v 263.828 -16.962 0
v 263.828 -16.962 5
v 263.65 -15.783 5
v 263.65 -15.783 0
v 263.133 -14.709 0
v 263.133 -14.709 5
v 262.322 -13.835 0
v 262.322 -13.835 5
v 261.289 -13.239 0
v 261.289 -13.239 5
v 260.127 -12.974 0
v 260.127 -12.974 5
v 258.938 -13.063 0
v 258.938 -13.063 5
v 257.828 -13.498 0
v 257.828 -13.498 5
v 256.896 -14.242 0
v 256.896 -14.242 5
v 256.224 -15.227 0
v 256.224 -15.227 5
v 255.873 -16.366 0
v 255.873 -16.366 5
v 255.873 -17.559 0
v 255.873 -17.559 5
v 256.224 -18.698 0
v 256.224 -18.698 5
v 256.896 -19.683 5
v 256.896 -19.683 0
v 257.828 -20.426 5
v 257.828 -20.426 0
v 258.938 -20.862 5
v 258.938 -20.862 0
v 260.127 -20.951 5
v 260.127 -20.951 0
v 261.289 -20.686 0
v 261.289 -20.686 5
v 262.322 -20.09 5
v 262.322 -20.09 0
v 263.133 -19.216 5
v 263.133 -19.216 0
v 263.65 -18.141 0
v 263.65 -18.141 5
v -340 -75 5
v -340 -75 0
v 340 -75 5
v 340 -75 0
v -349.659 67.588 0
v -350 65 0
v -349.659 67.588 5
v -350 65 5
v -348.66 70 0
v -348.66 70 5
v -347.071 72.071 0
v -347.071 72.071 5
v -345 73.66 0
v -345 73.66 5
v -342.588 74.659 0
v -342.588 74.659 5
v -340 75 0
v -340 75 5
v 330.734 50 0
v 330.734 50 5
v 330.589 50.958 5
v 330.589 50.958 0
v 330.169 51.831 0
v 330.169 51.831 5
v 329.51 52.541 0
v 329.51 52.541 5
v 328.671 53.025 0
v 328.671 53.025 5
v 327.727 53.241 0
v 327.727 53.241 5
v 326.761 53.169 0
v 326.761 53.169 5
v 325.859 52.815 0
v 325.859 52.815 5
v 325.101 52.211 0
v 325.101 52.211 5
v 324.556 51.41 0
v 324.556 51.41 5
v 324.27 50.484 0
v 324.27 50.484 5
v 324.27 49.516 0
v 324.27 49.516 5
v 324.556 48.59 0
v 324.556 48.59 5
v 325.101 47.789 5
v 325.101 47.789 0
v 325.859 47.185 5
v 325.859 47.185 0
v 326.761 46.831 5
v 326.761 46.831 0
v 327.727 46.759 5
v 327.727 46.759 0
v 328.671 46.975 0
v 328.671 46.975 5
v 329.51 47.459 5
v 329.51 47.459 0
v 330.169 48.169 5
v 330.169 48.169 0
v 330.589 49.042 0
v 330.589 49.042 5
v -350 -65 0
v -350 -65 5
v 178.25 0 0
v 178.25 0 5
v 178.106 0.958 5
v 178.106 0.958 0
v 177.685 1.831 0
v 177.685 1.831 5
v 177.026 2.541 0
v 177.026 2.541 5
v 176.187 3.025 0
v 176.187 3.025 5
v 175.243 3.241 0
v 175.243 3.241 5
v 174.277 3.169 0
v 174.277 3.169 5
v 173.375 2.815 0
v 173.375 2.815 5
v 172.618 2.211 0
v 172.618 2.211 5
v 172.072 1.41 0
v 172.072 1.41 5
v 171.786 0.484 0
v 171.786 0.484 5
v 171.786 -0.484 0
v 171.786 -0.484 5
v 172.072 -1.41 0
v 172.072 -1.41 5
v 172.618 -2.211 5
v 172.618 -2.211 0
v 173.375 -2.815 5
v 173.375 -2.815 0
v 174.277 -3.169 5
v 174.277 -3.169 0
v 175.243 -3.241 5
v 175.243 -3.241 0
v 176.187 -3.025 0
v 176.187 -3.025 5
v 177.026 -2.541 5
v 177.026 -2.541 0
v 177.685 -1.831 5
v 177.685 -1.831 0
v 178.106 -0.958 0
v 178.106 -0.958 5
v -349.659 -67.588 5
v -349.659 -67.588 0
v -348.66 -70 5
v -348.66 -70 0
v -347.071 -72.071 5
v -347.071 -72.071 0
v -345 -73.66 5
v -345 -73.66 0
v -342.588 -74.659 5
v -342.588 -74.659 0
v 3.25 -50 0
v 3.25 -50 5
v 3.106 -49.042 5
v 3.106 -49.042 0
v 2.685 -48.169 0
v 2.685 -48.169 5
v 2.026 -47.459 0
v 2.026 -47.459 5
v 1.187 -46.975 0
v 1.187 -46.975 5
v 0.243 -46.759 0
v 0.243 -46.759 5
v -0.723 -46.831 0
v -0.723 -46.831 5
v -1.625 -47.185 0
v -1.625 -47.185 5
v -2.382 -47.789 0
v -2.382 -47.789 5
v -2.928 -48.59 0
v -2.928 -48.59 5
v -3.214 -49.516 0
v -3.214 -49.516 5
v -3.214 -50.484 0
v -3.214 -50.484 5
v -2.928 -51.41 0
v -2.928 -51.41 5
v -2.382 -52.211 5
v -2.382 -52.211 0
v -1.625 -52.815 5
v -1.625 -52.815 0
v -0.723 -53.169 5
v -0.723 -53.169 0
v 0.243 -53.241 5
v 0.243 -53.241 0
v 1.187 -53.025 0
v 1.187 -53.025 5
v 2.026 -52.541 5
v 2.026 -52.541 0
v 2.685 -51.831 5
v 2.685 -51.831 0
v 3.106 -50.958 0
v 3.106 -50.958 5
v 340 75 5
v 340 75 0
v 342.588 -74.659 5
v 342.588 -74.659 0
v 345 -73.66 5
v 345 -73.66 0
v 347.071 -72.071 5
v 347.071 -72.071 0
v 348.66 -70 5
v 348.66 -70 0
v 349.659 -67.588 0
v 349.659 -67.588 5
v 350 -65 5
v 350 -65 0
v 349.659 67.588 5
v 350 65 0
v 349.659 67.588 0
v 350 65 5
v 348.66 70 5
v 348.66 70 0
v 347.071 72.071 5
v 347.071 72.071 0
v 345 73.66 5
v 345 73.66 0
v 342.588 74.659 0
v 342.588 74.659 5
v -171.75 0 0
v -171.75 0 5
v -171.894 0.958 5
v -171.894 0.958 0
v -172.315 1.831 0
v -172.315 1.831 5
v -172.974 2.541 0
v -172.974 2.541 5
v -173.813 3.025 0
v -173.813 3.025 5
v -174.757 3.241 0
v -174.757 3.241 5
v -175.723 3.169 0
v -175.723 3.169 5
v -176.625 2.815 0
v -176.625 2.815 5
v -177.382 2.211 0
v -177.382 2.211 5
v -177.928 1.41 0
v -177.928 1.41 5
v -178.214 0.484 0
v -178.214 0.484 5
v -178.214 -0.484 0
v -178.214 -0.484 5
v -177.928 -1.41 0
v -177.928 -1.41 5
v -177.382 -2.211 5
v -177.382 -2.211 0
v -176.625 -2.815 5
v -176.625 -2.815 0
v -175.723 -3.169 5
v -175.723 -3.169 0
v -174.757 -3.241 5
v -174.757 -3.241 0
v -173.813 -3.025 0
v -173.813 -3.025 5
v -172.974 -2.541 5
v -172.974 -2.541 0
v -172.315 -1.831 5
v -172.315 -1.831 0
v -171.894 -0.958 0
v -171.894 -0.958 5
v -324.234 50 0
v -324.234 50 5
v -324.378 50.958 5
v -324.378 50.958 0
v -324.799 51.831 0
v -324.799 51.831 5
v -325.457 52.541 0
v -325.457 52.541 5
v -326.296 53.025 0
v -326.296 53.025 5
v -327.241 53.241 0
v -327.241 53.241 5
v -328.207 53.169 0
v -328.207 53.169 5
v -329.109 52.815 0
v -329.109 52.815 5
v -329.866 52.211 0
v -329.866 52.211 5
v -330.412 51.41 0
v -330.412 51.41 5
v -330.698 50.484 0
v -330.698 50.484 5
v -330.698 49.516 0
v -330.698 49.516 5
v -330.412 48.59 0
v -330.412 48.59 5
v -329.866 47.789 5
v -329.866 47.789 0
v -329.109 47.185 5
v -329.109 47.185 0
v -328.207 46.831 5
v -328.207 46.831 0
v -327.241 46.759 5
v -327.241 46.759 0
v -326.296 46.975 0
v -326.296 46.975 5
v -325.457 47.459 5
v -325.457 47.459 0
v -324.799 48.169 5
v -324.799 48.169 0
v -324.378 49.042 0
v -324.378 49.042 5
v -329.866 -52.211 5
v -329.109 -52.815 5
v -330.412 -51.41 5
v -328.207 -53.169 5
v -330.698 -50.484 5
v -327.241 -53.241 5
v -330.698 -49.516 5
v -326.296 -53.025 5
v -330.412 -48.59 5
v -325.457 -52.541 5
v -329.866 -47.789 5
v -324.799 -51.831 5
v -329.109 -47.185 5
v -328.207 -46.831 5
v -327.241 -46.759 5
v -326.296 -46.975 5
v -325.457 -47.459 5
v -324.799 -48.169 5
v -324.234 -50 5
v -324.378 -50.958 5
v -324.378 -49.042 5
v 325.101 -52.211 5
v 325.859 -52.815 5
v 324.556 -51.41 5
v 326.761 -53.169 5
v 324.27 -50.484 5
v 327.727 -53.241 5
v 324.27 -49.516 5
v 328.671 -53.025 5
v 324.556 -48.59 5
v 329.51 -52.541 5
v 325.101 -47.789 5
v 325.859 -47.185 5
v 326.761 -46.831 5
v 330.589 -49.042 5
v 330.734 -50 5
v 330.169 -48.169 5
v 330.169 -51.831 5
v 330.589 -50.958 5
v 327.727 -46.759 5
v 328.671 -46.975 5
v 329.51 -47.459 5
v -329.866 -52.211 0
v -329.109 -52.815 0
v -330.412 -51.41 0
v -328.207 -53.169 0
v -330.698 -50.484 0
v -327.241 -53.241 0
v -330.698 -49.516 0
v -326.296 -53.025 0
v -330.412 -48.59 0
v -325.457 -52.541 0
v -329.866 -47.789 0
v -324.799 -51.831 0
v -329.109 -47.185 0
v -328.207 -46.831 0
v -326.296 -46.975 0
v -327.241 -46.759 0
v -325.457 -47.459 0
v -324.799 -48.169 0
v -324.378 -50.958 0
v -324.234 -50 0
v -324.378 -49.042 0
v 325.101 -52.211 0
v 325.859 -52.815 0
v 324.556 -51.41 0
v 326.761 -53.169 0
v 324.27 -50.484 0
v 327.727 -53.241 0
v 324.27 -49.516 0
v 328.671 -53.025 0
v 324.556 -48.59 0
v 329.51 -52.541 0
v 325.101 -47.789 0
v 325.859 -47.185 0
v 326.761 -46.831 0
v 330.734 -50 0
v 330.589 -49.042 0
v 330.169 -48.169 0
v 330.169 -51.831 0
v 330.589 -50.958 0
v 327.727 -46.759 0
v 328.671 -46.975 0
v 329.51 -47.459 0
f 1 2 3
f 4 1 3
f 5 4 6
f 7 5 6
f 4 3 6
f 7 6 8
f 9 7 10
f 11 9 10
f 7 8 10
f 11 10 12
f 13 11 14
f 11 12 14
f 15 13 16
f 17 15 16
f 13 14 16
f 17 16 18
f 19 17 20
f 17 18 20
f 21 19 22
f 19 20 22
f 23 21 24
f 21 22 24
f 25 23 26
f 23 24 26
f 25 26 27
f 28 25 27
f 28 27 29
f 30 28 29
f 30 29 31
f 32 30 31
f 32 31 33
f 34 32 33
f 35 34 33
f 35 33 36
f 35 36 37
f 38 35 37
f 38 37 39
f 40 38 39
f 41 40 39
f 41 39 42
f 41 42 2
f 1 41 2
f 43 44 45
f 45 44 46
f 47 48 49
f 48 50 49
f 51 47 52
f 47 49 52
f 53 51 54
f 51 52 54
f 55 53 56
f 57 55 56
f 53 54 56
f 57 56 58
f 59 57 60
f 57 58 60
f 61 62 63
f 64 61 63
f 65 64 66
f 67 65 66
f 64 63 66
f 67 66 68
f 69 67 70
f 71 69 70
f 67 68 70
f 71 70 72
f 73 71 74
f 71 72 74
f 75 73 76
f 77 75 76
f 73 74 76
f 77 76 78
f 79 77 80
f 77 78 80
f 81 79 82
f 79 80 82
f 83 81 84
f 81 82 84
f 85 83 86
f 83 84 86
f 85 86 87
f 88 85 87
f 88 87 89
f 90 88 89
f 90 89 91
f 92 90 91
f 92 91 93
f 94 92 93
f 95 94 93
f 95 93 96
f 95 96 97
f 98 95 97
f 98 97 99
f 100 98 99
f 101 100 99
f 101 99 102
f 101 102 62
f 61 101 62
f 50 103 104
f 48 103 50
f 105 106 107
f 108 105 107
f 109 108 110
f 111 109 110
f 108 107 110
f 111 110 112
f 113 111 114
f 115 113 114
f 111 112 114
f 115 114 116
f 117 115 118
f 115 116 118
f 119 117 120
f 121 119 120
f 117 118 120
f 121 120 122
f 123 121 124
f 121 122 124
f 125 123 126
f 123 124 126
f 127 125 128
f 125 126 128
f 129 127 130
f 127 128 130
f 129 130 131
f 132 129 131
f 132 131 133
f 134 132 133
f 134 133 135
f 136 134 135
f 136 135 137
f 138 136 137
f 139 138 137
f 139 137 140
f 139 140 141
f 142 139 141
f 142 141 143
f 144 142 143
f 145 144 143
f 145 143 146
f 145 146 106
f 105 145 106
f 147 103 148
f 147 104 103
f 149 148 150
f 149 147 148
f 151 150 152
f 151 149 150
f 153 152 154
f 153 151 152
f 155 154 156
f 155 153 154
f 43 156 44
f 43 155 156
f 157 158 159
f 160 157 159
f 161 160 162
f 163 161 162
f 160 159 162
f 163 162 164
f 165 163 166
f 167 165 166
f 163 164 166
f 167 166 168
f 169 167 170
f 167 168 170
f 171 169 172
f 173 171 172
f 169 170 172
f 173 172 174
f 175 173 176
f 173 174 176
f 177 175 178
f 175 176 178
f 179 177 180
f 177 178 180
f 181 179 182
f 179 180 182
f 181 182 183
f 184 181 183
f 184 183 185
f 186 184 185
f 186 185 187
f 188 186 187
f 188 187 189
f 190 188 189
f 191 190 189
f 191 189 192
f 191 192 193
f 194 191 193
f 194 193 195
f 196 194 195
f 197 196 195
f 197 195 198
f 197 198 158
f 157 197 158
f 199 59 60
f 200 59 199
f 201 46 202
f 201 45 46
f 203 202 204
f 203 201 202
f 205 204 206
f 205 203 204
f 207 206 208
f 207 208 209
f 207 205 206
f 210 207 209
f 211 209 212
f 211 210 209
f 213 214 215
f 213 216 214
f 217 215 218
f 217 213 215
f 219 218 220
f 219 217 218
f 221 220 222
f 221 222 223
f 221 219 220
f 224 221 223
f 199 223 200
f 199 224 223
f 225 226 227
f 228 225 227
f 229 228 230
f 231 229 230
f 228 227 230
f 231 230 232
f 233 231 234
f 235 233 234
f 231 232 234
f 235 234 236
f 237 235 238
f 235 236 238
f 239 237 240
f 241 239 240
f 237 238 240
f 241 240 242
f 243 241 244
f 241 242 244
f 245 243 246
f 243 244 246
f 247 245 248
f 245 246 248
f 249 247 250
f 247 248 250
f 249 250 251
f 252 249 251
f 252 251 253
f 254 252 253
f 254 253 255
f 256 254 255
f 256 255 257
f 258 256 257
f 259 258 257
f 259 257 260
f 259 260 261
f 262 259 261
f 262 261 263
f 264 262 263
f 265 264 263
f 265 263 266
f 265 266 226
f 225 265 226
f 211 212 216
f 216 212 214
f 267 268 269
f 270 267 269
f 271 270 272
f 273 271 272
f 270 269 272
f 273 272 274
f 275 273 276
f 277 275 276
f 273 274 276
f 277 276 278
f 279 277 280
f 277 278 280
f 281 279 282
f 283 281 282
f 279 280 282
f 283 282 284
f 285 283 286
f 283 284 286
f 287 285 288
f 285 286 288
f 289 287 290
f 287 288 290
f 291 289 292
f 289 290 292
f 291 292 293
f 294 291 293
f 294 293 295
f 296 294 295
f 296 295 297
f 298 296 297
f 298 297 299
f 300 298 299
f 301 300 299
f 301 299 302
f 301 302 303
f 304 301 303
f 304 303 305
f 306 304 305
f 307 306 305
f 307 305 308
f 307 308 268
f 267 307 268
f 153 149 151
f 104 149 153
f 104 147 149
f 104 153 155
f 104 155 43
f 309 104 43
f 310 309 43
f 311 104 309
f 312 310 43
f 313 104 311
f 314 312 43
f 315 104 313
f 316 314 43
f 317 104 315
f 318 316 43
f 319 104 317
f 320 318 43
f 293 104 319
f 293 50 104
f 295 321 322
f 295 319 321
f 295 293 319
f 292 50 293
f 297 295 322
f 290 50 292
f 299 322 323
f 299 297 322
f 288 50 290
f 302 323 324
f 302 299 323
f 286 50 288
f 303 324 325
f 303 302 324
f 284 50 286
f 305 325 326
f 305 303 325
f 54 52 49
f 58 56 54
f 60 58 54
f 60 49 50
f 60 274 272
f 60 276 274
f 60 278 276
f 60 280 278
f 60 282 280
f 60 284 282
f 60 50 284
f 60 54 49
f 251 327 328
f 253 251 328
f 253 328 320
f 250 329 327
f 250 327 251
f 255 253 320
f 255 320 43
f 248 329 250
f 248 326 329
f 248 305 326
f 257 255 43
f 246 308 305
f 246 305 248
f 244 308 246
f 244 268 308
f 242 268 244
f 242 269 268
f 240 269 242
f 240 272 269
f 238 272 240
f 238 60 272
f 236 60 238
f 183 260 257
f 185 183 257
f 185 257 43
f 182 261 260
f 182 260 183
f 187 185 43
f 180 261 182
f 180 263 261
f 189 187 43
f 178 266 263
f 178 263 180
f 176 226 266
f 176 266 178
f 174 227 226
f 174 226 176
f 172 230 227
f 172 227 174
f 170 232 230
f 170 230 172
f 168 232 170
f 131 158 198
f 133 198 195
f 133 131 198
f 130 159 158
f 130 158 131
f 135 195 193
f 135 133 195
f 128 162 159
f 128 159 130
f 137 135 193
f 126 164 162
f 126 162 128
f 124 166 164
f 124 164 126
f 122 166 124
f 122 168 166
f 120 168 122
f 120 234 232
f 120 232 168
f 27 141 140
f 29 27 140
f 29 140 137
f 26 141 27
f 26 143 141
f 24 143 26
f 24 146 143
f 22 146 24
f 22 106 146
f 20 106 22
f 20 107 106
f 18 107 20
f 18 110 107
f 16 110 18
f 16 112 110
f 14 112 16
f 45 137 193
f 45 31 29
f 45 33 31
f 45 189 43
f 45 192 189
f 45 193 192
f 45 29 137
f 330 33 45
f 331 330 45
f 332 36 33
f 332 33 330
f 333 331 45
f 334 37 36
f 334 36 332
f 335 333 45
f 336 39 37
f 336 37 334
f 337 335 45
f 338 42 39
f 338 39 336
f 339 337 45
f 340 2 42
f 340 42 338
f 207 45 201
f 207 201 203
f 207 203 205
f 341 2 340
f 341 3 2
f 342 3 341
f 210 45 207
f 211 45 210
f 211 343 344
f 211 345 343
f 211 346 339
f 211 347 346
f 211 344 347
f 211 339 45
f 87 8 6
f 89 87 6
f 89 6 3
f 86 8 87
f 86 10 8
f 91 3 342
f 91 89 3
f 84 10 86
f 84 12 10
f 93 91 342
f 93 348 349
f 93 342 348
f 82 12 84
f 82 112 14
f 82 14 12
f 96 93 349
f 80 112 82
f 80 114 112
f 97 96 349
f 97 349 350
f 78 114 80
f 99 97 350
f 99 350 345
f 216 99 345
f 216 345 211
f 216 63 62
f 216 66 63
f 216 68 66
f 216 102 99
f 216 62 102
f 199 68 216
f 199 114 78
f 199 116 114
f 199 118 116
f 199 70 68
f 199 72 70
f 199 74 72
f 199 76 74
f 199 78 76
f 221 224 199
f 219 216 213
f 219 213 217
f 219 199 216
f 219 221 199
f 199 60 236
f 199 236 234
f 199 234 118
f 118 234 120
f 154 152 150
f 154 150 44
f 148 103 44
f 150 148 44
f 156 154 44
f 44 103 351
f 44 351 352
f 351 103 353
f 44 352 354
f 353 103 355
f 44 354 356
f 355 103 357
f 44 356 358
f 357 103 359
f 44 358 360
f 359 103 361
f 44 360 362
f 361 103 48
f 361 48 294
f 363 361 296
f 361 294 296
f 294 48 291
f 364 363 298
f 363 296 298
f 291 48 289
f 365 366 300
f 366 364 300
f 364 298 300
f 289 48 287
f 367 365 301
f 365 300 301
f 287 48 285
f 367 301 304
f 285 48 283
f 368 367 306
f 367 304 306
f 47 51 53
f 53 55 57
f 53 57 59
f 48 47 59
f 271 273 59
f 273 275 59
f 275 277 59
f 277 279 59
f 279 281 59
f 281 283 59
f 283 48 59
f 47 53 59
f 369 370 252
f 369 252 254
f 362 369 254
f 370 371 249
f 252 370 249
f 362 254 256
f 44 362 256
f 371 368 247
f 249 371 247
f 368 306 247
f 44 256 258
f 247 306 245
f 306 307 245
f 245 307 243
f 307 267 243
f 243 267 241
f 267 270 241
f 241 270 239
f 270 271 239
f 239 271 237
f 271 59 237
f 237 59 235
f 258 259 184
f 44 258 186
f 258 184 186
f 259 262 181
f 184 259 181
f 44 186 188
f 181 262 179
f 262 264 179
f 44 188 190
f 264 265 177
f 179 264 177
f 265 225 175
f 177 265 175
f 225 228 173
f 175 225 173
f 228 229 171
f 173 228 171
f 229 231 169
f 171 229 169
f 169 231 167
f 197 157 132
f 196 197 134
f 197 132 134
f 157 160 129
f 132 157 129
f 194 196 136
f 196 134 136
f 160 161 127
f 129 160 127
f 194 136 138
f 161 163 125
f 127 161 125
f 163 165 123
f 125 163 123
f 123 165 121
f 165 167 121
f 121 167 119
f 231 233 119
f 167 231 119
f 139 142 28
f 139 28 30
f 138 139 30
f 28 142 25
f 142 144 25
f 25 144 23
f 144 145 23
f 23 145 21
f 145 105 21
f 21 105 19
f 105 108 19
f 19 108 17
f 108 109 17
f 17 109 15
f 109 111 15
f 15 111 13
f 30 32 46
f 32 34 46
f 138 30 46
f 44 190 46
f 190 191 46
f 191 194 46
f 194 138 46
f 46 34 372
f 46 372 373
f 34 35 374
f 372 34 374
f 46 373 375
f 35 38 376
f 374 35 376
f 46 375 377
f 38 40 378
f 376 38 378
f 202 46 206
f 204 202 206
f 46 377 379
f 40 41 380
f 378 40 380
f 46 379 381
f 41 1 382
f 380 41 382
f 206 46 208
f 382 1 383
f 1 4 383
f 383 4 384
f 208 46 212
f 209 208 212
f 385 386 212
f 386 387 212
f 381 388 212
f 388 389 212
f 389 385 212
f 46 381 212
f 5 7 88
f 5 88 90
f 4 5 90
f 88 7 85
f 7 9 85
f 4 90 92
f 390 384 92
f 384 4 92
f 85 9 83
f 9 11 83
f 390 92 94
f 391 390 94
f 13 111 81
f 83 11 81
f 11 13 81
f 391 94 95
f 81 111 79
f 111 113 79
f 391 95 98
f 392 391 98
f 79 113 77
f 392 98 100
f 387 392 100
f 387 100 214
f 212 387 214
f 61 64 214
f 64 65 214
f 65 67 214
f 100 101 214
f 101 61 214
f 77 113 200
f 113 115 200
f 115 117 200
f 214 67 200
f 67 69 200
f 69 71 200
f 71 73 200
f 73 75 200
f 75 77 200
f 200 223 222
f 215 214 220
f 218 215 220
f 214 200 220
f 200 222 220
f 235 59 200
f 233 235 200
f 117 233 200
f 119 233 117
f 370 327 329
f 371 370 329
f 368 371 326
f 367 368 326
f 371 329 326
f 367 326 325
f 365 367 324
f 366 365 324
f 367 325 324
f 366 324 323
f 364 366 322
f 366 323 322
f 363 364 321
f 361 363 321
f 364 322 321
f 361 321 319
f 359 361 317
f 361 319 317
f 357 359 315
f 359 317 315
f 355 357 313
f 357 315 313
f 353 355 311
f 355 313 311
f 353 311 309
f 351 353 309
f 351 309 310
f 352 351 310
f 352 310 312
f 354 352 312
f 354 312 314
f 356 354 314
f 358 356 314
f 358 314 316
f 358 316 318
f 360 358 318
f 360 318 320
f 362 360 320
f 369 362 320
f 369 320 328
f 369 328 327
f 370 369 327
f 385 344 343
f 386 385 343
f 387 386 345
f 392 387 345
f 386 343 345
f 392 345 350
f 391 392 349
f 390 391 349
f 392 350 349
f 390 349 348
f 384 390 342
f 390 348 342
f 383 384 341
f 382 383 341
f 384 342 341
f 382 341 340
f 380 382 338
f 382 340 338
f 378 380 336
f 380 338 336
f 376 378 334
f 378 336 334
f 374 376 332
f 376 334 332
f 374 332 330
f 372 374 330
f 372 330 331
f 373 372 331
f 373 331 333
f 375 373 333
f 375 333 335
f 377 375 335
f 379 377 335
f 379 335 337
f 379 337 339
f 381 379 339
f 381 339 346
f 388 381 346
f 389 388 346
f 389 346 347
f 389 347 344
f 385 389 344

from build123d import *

# Parameters (mm, degrees)
SKETCH1_W           = 700
SKETCH1_H           = 150
BOSS_EXTRUDE1_DEPTH = 5
FILLET1_R           = 10
SKETCH3_R           = 3.25
CUT_EXTRUDE1_DEPTH  = 270
SKETCH4_R           = 4
CUT_EXTRUDE2_DEPTH  = 10
SKETCH5_R           = 4
BOSS_EXTRUDE2_DEPTH = 5
SKETCH6_R           = 4
CUT_EXTRUDE3_DEPTH  = 20


with BuildPart() as part:
    # Sketch1 → Boss-Extrude1 (new body)
    with BuildSketch(Plane.XY):
        Rectangle(SKETCH1_W, SKETCH1_H)
    extrude(amount=BOSS_EXTRUDE1_DEPTH)

    # Fillet1
    fillet1_edges = [part.edges().sort_by_distance(p)[0] for p in [
        (350, -75, 2.5),
        (-350, -75, 2.5),
        (-350, 75, 2.5),
        (350, 75, 2.5),
    ]]
    fillet(fillet1_edges, radius=FILLET1_R)

    # Sketch3 → Cut-Extrude1 (cut)
    with BuildSketch(Plane.XY.offset(5)):
        with Locations((0, -50)):
            Circle(SKETCH3_R)
        with Locations((-327.483802204, -50)):
            Circle(SKETCH3_R)
        with Locations((327.483802204, -50)):
            Circle(SKETCH3_R)
        with Locations((-327.483802204, 50)):
            Circle(SKETCH3_R)
        with Locations((-175, 0)):
            Circle(SKETCH3_R)
        with Locations((175, 0)):
            Circle(SKETCH3_R)
        with Locations((327.483802204, 50)):
            Circle(SKETCH3_R)
    extrude(amount=-CUT_EXTRUDE1_DEPTH, mode=Mode.SUBTRACT)

    # Sketch4 → Cut-Extrude2 (cut)
    with BuildSketch(Plane.XY.offset(5)):
        with Locations((245.65923276, -46.5)):
            Circle(SKETCH4_R)
    extrude(amount=-CUT_EXTRUDE2_DEPTH, mode=Mode.SUBTRACT)

    # Sketch5 → Boss-Extrude2 (add)
    with BuildSketch(Plane.XY.offset(5)):
        with Locations((245.65923276, -46.5)):
            Circle(SKETCH5_R)
    extrude(amount=-BOSS_EXTRUDE2_DEPTH)

    # Sketch6 → Cut-Extrude3 (cut)
    with BuildSketch(Plane.XY.offset(5)):
        with Locations((259.827830127, -16.962361372)):
            Circle(SKETCH6_R)
    extrude(amount=-CUT_EXTRUDE3_DEPTH, mode=Mode.SUBTRACT)


solid = part.part
